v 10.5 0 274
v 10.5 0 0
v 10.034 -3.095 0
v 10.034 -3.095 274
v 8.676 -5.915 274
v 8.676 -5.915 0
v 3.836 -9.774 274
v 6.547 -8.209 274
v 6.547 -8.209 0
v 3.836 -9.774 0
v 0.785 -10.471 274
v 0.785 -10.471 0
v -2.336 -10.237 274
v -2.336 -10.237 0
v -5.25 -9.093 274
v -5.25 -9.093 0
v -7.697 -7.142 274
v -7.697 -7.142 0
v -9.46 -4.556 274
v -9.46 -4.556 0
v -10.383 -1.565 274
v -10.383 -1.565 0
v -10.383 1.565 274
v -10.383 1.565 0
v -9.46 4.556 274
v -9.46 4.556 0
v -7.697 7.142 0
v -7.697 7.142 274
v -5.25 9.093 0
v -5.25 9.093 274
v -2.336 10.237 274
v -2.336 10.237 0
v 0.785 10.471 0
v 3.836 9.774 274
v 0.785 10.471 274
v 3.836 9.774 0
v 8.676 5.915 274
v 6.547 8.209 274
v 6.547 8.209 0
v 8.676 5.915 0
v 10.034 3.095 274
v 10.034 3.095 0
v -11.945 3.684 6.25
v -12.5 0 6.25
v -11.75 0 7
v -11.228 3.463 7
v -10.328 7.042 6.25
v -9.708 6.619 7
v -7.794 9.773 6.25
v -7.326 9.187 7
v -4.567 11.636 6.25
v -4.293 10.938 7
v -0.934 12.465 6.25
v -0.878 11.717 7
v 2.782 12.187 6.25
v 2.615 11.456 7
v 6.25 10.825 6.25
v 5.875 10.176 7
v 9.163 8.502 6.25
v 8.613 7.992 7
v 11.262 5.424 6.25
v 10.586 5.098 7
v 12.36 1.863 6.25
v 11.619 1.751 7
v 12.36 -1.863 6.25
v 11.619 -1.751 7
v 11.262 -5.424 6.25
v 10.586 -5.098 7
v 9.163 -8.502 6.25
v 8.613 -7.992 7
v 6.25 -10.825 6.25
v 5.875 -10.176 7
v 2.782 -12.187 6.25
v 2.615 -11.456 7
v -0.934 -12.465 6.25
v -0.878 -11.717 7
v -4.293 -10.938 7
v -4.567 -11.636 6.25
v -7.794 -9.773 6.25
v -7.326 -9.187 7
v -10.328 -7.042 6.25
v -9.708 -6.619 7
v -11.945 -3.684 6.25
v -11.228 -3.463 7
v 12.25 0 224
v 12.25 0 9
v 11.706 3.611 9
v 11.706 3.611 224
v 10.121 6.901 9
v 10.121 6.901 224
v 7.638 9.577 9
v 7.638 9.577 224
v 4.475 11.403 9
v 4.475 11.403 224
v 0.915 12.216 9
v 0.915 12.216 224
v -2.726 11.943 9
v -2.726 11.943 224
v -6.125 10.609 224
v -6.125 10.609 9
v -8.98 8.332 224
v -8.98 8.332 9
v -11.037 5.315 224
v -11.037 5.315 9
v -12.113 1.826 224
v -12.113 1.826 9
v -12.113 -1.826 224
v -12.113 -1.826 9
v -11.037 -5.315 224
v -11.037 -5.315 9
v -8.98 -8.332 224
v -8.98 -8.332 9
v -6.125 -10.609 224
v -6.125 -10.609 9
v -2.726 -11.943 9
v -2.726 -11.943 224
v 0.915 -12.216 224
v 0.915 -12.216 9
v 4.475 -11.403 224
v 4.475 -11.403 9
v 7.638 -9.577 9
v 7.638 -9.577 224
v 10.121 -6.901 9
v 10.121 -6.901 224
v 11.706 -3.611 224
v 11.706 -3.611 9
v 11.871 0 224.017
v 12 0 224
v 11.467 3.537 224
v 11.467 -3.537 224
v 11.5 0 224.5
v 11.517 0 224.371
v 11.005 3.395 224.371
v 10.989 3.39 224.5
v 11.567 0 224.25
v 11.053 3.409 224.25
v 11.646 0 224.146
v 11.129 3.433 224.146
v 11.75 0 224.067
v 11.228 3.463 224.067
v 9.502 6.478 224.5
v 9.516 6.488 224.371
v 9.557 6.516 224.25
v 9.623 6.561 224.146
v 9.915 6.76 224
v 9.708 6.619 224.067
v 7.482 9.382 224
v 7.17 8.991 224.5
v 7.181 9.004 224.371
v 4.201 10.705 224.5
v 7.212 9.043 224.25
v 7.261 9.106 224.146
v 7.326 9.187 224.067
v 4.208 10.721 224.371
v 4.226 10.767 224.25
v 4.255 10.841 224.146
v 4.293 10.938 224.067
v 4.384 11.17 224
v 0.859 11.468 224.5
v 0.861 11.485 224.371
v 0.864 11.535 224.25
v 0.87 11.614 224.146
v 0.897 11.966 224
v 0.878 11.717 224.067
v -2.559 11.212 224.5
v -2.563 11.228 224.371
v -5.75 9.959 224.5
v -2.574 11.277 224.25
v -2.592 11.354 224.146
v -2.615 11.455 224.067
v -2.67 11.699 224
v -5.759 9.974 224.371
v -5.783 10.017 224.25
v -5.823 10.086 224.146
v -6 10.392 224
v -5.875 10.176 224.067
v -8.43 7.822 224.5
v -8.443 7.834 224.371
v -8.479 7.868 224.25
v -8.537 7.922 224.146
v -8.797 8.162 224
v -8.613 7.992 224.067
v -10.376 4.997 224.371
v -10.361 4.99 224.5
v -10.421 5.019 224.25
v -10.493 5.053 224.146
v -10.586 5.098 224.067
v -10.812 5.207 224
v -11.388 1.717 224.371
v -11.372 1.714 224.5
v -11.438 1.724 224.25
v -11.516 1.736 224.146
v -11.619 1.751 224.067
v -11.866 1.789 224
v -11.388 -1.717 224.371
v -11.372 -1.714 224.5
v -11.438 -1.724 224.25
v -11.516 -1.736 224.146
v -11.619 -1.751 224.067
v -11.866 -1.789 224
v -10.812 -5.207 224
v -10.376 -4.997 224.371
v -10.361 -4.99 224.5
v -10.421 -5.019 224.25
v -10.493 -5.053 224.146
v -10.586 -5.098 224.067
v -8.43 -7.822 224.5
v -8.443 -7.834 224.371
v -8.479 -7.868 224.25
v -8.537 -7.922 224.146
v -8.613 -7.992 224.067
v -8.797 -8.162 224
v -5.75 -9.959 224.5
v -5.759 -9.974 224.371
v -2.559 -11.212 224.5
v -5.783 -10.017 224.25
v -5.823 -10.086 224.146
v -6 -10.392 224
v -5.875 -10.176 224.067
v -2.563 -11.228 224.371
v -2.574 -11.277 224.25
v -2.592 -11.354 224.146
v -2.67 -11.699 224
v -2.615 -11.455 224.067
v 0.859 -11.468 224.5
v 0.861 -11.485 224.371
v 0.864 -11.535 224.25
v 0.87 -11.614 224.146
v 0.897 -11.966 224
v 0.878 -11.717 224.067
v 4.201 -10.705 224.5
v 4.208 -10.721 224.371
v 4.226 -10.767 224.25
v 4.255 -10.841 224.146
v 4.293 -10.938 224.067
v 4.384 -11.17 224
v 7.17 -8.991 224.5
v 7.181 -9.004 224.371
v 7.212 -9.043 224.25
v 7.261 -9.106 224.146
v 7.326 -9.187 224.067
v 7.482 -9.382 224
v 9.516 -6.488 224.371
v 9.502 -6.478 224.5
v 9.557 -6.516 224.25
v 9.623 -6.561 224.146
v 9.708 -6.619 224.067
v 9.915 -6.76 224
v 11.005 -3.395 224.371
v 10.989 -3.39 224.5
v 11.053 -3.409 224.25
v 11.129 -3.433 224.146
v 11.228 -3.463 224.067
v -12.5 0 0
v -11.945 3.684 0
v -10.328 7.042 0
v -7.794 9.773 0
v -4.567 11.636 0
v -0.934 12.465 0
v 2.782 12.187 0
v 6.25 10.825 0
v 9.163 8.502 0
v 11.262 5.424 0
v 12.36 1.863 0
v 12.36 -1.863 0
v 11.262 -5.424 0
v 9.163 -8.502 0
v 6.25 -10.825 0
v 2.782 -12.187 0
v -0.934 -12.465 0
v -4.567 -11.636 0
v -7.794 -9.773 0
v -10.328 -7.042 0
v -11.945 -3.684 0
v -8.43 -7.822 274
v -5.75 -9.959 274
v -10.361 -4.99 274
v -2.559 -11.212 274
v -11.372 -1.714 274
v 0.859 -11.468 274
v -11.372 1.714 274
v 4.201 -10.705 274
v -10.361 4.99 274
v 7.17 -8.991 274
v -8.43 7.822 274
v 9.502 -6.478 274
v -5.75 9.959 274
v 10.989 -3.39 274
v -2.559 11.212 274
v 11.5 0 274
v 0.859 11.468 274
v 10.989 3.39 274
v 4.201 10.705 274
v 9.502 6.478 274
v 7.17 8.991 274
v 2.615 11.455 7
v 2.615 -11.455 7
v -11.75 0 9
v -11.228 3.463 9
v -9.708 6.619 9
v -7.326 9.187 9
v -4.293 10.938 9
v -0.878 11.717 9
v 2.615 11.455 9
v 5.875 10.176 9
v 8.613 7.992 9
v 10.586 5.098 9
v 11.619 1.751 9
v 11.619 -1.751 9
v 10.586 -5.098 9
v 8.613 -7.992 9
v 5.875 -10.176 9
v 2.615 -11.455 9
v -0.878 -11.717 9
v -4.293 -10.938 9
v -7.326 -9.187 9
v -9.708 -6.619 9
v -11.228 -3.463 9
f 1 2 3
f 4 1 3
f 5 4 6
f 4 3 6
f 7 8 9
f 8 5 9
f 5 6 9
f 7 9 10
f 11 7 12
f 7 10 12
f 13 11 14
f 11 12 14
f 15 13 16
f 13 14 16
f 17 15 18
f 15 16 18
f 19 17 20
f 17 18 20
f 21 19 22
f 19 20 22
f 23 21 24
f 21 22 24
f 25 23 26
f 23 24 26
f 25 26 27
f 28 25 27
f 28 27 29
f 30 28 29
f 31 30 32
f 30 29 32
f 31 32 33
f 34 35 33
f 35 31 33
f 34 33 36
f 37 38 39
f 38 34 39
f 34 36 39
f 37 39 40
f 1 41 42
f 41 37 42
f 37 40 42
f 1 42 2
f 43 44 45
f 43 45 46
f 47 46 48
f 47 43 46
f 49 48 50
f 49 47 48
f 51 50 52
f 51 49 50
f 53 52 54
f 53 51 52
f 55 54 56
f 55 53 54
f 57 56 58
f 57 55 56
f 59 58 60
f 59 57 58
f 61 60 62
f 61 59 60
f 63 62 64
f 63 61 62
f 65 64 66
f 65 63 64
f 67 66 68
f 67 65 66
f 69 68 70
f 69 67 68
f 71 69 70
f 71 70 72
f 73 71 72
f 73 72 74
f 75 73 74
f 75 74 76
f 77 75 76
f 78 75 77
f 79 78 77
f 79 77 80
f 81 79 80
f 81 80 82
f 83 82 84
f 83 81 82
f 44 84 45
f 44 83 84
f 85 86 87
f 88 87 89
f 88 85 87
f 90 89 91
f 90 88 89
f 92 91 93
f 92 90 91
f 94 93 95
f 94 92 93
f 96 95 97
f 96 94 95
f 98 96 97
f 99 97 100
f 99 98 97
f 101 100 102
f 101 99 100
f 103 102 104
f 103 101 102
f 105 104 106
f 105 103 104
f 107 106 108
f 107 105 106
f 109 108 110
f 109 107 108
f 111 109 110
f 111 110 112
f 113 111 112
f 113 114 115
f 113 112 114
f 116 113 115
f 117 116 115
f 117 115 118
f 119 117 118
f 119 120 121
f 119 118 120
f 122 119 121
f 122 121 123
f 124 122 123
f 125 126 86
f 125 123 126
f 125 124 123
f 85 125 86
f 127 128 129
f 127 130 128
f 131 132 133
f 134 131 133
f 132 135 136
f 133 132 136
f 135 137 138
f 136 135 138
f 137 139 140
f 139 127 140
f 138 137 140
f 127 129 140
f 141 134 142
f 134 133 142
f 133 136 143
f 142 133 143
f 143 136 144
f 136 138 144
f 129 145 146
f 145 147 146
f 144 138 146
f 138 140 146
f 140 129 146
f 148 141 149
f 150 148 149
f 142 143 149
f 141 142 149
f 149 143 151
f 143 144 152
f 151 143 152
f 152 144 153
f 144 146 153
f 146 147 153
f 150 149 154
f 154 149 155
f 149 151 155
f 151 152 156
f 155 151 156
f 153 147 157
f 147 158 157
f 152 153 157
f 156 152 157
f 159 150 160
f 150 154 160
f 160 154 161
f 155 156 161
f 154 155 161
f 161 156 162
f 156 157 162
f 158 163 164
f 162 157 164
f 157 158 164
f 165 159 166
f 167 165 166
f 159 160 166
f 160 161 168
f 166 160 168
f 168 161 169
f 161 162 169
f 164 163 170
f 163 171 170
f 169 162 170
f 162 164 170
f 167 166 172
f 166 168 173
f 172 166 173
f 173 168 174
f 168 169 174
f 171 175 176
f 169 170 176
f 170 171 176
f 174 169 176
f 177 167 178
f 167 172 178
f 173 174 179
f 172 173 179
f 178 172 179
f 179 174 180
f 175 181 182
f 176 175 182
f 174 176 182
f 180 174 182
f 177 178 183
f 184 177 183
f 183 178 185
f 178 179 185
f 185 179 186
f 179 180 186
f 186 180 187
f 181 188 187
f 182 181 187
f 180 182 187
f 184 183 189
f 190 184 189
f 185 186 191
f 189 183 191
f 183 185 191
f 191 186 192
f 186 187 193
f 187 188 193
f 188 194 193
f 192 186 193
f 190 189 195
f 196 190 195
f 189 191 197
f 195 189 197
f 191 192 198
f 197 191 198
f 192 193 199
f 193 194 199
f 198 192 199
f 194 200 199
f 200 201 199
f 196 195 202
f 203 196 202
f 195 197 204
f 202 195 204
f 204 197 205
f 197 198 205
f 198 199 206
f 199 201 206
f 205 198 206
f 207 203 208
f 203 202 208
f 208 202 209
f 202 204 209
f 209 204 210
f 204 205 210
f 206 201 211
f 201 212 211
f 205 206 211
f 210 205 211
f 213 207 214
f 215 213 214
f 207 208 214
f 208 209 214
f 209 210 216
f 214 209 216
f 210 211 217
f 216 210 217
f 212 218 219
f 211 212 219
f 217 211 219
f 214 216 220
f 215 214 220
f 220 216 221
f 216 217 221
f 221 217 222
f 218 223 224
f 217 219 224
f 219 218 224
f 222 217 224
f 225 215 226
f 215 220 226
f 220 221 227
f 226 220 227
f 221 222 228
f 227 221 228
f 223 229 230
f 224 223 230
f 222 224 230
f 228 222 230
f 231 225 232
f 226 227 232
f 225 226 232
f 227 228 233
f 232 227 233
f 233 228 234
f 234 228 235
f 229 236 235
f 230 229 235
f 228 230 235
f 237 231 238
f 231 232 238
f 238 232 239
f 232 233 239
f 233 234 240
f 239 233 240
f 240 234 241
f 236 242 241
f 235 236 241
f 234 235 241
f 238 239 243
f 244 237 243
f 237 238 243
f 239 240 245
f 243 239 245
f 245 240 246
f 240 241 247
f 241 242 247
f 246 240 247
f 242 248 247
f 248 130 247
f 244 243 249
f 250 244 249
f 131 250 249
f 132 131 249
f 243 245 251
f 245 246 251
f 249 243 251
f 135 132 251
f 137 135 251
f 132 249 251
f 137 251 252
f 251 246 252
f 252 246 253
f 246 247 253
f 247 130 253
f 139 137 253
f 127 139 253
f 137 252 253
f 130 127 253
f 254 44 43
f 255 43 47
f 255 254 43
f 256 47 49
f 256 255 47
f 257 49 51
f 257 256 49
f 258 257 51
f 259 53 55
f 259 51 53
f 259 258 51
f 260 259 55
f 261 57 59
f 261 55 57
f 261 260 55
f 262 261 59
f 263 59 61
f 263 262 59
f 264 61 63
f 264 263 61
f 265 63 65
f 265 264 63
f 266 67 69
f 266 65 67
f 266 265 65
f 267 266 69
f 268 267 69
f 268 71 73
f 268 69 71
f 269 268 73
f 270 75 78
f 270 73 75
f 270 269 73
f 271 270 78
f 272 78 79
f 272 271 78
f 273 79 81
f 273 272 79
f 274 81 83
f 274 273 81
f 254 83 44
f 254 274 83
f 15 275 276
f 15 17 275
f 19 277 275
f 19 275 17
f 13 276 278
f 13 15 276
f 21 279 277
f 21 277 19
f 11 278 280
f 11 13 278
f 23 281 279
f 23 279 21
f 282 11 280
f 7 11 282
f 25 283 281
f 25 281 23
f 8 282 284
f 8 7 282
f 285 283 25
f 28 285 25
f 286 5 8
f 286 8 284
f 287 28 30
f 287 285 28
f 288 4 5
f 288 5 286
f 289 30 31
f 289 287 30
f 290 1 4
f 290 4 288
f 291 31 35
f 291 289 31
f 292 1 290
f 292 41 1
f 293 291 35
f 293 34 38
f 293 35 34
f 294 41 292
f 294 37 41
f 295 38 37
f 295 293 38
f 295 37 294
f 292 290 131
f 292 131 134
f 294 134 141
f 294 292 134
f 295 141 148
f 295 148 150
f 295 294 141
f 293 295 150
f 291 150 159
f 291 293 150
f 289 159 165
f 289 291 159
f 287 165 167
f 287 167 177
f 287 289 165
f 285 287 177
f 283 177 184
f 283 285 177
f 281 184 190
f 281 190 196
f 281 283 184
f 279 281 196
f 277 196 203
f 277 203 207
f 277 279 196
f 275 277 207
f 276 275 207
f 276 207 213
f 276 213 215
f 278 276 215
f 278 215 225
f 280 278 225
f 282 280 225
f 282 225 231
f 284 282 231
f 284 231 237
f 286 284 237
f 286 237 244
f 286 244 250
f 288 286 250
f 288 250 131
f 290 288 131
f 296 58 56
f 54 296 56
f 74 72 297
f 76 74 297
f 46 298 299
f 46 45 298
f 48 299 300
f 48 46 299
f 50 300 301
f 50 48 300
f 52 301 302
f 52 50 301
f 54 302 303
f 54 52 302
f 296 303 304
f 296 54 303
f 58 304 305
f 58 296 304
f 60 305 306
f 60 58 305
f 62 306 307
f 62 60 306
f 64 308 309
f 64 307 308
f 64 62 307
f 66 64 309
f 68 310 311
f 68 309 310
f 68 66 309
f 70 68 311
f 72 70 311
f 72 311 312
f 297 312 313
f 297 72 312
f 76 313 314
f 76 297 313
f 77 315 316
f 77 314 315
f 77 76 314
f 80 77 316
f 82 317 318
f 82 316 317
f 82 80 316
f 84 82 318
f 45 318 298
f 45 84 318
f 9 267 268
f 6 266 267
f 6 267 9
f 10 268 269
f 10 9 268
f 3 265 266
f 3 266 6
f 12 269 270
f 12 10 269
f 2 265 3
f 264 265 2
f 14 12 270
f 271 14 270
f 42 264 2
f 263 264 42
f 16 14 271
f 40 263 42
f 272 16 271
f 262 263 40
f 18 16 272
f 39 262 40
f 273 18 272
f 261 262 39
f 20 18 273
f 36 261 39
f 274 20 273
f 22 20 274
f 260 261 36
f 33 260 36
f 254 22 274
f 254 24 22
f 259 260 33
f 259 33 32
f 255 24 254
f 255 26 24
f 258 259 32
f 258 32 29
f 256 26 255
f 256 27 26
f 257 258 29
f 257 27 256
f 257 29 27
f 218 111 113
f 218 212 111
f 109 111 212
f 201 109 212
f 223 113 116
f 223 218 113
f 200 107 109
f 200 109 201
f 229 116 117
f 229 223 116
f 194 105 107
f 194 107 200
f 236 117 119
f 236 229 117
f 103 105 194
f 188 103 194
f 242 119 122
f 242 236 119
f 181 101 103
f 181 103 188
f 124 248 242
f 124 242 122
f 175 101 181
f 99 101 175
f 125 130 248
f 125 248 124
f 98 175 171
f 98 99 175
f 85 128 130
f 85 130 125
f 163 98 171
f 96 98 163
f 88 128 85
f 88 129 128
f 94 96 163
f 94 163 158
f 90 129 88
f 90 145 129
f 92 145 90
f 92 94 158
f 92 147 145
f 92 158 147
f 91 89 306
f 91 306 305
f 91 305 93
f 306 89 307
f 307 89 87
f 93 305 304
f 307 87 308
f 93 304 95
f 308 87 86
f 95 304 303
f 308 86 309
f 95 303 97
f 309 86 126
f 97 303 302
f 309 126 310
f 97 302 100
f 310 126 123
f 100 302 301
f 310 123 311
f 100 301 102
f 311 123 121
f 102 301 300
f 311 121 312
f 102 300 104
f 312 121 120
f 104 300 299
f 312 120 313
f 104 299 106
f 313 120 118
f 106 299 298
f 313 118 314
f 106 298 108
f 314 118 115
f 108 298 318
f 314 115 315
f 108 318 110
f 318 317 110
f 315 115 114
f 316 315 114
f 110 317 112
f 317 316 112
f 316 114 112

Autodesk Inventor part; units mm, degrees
ref_plane "YZ Plane" through (0, 0, 0) normal (1, 0, 0) x (0, 1, 0)
ref_plane "XZ Plane" through (0, 0, 0) normal (0, 1, 0) x (-1, 0, 0)
ref_plane "XY Plane" through (0, 0, 0) normal (0, 0, 1) x (1, 0, 0)
sketch "Skizze1" plane through (0, 0, 0) normal (0, 0, 1) x (1, 0, 0)
  circle A0 centre (0, 0) radius 10.5
  circle A1 centre (0, 0) radius 12.55
  dimension "d0" = 25.1
  dimension "d1" = 2.05
extrude "Extrusion1" add sketch "Skizze1" along normal blind 274
sketch "Skizze2" plane through (0, 0, 274) normal (0, 0, 1) x (1, 0, 0)
  circle A0 centre (0, 0) radius 12.55 projected
  circle A1 centre (0, 0) radius 12.25
  dimension "d4" = 24.5
extrude "Extrusion2" cut sketch "Skizze2" against normal through all
sketch "Skizze3" plane through (0, 0, 0) normal (0, 0, -1) x (-1, 0, 0)
  circle A0 centre (0, 0) radius 12.25 projected
  circle A1 centre (0, 0) radius 10.5 projected
  circle A2 centre (0, 0) radius 12.5
  dimension "d7" = 25
extrude "Extrusion3" add sketch "Skizze3" against normal blind 9 contours A2
sketch "Skizze4" plane through (0, 0, 274) normal (0, 0, 1) x (1, 0, 0)
  circle A0 centre (0, 0) radius 12.25 projected
  circle A1 centre (0, 0) radius 10.5 projected
  circle A2 centre (0, 0) radius 11.5
  dimension "d10" = 23
extrude "Extrusion4" cut sketch "Skizze4" against normal blind 50 contours A0
sketch "Skizze5" plane through (0, 0, 0) normal (0, 1, 0) x (-1, 0, 0)
  line L0 (-12.5, 9) -> (12.5, 9) projected
  line L1 (12.5, 0) -> (-12.5, 0) projected
  line L2 (12.25, 9) -> (-12.25, 9) projected
  line L3 (12.5, 0) -> (12.5, 9) projected
  line L4 (10.5, 0) -> (10.5, 274) projected
  line L5 (12.25, 224) -> (12.25, 9) projected
  line L6 (12.5, 9) -> (11.75, 9)
  line L7 (11.75, 9) -> (11.75, 7)
  line L8 (11.75, 7) -> (12.5, 7)
  line L9 (12.5, 7) -> (12.5, 9)
  line L10 (17.5, 0) -> (-17.5, 0) projected
  line L11 (0, -54.8) -> (0, 328.8) projected
  point P0 (0, 0)
  point P1 (-9.75, 200)
  point P2 (9.75, 200)
  dimension "d13" = 2
  dimension "d14" = 23.5
revolve "Umdrehung1" cut sketch "Skizze5" angle 360 about axis through (0, 0, -10) along (0, 0, 1) contours L0 L3 L8 L7
chamfer "Fase1" distance 0.75 angle 45 1 edges at (12.5, 0, 7)
thread "Gewinde3" size "M25x1" class "6g" standard "ANSI Metric M Profile" full length
fillet "Rundung1" radius 0.5 1 edges at (-11.5, 0, 224)
properties part number "13_0204_025"
